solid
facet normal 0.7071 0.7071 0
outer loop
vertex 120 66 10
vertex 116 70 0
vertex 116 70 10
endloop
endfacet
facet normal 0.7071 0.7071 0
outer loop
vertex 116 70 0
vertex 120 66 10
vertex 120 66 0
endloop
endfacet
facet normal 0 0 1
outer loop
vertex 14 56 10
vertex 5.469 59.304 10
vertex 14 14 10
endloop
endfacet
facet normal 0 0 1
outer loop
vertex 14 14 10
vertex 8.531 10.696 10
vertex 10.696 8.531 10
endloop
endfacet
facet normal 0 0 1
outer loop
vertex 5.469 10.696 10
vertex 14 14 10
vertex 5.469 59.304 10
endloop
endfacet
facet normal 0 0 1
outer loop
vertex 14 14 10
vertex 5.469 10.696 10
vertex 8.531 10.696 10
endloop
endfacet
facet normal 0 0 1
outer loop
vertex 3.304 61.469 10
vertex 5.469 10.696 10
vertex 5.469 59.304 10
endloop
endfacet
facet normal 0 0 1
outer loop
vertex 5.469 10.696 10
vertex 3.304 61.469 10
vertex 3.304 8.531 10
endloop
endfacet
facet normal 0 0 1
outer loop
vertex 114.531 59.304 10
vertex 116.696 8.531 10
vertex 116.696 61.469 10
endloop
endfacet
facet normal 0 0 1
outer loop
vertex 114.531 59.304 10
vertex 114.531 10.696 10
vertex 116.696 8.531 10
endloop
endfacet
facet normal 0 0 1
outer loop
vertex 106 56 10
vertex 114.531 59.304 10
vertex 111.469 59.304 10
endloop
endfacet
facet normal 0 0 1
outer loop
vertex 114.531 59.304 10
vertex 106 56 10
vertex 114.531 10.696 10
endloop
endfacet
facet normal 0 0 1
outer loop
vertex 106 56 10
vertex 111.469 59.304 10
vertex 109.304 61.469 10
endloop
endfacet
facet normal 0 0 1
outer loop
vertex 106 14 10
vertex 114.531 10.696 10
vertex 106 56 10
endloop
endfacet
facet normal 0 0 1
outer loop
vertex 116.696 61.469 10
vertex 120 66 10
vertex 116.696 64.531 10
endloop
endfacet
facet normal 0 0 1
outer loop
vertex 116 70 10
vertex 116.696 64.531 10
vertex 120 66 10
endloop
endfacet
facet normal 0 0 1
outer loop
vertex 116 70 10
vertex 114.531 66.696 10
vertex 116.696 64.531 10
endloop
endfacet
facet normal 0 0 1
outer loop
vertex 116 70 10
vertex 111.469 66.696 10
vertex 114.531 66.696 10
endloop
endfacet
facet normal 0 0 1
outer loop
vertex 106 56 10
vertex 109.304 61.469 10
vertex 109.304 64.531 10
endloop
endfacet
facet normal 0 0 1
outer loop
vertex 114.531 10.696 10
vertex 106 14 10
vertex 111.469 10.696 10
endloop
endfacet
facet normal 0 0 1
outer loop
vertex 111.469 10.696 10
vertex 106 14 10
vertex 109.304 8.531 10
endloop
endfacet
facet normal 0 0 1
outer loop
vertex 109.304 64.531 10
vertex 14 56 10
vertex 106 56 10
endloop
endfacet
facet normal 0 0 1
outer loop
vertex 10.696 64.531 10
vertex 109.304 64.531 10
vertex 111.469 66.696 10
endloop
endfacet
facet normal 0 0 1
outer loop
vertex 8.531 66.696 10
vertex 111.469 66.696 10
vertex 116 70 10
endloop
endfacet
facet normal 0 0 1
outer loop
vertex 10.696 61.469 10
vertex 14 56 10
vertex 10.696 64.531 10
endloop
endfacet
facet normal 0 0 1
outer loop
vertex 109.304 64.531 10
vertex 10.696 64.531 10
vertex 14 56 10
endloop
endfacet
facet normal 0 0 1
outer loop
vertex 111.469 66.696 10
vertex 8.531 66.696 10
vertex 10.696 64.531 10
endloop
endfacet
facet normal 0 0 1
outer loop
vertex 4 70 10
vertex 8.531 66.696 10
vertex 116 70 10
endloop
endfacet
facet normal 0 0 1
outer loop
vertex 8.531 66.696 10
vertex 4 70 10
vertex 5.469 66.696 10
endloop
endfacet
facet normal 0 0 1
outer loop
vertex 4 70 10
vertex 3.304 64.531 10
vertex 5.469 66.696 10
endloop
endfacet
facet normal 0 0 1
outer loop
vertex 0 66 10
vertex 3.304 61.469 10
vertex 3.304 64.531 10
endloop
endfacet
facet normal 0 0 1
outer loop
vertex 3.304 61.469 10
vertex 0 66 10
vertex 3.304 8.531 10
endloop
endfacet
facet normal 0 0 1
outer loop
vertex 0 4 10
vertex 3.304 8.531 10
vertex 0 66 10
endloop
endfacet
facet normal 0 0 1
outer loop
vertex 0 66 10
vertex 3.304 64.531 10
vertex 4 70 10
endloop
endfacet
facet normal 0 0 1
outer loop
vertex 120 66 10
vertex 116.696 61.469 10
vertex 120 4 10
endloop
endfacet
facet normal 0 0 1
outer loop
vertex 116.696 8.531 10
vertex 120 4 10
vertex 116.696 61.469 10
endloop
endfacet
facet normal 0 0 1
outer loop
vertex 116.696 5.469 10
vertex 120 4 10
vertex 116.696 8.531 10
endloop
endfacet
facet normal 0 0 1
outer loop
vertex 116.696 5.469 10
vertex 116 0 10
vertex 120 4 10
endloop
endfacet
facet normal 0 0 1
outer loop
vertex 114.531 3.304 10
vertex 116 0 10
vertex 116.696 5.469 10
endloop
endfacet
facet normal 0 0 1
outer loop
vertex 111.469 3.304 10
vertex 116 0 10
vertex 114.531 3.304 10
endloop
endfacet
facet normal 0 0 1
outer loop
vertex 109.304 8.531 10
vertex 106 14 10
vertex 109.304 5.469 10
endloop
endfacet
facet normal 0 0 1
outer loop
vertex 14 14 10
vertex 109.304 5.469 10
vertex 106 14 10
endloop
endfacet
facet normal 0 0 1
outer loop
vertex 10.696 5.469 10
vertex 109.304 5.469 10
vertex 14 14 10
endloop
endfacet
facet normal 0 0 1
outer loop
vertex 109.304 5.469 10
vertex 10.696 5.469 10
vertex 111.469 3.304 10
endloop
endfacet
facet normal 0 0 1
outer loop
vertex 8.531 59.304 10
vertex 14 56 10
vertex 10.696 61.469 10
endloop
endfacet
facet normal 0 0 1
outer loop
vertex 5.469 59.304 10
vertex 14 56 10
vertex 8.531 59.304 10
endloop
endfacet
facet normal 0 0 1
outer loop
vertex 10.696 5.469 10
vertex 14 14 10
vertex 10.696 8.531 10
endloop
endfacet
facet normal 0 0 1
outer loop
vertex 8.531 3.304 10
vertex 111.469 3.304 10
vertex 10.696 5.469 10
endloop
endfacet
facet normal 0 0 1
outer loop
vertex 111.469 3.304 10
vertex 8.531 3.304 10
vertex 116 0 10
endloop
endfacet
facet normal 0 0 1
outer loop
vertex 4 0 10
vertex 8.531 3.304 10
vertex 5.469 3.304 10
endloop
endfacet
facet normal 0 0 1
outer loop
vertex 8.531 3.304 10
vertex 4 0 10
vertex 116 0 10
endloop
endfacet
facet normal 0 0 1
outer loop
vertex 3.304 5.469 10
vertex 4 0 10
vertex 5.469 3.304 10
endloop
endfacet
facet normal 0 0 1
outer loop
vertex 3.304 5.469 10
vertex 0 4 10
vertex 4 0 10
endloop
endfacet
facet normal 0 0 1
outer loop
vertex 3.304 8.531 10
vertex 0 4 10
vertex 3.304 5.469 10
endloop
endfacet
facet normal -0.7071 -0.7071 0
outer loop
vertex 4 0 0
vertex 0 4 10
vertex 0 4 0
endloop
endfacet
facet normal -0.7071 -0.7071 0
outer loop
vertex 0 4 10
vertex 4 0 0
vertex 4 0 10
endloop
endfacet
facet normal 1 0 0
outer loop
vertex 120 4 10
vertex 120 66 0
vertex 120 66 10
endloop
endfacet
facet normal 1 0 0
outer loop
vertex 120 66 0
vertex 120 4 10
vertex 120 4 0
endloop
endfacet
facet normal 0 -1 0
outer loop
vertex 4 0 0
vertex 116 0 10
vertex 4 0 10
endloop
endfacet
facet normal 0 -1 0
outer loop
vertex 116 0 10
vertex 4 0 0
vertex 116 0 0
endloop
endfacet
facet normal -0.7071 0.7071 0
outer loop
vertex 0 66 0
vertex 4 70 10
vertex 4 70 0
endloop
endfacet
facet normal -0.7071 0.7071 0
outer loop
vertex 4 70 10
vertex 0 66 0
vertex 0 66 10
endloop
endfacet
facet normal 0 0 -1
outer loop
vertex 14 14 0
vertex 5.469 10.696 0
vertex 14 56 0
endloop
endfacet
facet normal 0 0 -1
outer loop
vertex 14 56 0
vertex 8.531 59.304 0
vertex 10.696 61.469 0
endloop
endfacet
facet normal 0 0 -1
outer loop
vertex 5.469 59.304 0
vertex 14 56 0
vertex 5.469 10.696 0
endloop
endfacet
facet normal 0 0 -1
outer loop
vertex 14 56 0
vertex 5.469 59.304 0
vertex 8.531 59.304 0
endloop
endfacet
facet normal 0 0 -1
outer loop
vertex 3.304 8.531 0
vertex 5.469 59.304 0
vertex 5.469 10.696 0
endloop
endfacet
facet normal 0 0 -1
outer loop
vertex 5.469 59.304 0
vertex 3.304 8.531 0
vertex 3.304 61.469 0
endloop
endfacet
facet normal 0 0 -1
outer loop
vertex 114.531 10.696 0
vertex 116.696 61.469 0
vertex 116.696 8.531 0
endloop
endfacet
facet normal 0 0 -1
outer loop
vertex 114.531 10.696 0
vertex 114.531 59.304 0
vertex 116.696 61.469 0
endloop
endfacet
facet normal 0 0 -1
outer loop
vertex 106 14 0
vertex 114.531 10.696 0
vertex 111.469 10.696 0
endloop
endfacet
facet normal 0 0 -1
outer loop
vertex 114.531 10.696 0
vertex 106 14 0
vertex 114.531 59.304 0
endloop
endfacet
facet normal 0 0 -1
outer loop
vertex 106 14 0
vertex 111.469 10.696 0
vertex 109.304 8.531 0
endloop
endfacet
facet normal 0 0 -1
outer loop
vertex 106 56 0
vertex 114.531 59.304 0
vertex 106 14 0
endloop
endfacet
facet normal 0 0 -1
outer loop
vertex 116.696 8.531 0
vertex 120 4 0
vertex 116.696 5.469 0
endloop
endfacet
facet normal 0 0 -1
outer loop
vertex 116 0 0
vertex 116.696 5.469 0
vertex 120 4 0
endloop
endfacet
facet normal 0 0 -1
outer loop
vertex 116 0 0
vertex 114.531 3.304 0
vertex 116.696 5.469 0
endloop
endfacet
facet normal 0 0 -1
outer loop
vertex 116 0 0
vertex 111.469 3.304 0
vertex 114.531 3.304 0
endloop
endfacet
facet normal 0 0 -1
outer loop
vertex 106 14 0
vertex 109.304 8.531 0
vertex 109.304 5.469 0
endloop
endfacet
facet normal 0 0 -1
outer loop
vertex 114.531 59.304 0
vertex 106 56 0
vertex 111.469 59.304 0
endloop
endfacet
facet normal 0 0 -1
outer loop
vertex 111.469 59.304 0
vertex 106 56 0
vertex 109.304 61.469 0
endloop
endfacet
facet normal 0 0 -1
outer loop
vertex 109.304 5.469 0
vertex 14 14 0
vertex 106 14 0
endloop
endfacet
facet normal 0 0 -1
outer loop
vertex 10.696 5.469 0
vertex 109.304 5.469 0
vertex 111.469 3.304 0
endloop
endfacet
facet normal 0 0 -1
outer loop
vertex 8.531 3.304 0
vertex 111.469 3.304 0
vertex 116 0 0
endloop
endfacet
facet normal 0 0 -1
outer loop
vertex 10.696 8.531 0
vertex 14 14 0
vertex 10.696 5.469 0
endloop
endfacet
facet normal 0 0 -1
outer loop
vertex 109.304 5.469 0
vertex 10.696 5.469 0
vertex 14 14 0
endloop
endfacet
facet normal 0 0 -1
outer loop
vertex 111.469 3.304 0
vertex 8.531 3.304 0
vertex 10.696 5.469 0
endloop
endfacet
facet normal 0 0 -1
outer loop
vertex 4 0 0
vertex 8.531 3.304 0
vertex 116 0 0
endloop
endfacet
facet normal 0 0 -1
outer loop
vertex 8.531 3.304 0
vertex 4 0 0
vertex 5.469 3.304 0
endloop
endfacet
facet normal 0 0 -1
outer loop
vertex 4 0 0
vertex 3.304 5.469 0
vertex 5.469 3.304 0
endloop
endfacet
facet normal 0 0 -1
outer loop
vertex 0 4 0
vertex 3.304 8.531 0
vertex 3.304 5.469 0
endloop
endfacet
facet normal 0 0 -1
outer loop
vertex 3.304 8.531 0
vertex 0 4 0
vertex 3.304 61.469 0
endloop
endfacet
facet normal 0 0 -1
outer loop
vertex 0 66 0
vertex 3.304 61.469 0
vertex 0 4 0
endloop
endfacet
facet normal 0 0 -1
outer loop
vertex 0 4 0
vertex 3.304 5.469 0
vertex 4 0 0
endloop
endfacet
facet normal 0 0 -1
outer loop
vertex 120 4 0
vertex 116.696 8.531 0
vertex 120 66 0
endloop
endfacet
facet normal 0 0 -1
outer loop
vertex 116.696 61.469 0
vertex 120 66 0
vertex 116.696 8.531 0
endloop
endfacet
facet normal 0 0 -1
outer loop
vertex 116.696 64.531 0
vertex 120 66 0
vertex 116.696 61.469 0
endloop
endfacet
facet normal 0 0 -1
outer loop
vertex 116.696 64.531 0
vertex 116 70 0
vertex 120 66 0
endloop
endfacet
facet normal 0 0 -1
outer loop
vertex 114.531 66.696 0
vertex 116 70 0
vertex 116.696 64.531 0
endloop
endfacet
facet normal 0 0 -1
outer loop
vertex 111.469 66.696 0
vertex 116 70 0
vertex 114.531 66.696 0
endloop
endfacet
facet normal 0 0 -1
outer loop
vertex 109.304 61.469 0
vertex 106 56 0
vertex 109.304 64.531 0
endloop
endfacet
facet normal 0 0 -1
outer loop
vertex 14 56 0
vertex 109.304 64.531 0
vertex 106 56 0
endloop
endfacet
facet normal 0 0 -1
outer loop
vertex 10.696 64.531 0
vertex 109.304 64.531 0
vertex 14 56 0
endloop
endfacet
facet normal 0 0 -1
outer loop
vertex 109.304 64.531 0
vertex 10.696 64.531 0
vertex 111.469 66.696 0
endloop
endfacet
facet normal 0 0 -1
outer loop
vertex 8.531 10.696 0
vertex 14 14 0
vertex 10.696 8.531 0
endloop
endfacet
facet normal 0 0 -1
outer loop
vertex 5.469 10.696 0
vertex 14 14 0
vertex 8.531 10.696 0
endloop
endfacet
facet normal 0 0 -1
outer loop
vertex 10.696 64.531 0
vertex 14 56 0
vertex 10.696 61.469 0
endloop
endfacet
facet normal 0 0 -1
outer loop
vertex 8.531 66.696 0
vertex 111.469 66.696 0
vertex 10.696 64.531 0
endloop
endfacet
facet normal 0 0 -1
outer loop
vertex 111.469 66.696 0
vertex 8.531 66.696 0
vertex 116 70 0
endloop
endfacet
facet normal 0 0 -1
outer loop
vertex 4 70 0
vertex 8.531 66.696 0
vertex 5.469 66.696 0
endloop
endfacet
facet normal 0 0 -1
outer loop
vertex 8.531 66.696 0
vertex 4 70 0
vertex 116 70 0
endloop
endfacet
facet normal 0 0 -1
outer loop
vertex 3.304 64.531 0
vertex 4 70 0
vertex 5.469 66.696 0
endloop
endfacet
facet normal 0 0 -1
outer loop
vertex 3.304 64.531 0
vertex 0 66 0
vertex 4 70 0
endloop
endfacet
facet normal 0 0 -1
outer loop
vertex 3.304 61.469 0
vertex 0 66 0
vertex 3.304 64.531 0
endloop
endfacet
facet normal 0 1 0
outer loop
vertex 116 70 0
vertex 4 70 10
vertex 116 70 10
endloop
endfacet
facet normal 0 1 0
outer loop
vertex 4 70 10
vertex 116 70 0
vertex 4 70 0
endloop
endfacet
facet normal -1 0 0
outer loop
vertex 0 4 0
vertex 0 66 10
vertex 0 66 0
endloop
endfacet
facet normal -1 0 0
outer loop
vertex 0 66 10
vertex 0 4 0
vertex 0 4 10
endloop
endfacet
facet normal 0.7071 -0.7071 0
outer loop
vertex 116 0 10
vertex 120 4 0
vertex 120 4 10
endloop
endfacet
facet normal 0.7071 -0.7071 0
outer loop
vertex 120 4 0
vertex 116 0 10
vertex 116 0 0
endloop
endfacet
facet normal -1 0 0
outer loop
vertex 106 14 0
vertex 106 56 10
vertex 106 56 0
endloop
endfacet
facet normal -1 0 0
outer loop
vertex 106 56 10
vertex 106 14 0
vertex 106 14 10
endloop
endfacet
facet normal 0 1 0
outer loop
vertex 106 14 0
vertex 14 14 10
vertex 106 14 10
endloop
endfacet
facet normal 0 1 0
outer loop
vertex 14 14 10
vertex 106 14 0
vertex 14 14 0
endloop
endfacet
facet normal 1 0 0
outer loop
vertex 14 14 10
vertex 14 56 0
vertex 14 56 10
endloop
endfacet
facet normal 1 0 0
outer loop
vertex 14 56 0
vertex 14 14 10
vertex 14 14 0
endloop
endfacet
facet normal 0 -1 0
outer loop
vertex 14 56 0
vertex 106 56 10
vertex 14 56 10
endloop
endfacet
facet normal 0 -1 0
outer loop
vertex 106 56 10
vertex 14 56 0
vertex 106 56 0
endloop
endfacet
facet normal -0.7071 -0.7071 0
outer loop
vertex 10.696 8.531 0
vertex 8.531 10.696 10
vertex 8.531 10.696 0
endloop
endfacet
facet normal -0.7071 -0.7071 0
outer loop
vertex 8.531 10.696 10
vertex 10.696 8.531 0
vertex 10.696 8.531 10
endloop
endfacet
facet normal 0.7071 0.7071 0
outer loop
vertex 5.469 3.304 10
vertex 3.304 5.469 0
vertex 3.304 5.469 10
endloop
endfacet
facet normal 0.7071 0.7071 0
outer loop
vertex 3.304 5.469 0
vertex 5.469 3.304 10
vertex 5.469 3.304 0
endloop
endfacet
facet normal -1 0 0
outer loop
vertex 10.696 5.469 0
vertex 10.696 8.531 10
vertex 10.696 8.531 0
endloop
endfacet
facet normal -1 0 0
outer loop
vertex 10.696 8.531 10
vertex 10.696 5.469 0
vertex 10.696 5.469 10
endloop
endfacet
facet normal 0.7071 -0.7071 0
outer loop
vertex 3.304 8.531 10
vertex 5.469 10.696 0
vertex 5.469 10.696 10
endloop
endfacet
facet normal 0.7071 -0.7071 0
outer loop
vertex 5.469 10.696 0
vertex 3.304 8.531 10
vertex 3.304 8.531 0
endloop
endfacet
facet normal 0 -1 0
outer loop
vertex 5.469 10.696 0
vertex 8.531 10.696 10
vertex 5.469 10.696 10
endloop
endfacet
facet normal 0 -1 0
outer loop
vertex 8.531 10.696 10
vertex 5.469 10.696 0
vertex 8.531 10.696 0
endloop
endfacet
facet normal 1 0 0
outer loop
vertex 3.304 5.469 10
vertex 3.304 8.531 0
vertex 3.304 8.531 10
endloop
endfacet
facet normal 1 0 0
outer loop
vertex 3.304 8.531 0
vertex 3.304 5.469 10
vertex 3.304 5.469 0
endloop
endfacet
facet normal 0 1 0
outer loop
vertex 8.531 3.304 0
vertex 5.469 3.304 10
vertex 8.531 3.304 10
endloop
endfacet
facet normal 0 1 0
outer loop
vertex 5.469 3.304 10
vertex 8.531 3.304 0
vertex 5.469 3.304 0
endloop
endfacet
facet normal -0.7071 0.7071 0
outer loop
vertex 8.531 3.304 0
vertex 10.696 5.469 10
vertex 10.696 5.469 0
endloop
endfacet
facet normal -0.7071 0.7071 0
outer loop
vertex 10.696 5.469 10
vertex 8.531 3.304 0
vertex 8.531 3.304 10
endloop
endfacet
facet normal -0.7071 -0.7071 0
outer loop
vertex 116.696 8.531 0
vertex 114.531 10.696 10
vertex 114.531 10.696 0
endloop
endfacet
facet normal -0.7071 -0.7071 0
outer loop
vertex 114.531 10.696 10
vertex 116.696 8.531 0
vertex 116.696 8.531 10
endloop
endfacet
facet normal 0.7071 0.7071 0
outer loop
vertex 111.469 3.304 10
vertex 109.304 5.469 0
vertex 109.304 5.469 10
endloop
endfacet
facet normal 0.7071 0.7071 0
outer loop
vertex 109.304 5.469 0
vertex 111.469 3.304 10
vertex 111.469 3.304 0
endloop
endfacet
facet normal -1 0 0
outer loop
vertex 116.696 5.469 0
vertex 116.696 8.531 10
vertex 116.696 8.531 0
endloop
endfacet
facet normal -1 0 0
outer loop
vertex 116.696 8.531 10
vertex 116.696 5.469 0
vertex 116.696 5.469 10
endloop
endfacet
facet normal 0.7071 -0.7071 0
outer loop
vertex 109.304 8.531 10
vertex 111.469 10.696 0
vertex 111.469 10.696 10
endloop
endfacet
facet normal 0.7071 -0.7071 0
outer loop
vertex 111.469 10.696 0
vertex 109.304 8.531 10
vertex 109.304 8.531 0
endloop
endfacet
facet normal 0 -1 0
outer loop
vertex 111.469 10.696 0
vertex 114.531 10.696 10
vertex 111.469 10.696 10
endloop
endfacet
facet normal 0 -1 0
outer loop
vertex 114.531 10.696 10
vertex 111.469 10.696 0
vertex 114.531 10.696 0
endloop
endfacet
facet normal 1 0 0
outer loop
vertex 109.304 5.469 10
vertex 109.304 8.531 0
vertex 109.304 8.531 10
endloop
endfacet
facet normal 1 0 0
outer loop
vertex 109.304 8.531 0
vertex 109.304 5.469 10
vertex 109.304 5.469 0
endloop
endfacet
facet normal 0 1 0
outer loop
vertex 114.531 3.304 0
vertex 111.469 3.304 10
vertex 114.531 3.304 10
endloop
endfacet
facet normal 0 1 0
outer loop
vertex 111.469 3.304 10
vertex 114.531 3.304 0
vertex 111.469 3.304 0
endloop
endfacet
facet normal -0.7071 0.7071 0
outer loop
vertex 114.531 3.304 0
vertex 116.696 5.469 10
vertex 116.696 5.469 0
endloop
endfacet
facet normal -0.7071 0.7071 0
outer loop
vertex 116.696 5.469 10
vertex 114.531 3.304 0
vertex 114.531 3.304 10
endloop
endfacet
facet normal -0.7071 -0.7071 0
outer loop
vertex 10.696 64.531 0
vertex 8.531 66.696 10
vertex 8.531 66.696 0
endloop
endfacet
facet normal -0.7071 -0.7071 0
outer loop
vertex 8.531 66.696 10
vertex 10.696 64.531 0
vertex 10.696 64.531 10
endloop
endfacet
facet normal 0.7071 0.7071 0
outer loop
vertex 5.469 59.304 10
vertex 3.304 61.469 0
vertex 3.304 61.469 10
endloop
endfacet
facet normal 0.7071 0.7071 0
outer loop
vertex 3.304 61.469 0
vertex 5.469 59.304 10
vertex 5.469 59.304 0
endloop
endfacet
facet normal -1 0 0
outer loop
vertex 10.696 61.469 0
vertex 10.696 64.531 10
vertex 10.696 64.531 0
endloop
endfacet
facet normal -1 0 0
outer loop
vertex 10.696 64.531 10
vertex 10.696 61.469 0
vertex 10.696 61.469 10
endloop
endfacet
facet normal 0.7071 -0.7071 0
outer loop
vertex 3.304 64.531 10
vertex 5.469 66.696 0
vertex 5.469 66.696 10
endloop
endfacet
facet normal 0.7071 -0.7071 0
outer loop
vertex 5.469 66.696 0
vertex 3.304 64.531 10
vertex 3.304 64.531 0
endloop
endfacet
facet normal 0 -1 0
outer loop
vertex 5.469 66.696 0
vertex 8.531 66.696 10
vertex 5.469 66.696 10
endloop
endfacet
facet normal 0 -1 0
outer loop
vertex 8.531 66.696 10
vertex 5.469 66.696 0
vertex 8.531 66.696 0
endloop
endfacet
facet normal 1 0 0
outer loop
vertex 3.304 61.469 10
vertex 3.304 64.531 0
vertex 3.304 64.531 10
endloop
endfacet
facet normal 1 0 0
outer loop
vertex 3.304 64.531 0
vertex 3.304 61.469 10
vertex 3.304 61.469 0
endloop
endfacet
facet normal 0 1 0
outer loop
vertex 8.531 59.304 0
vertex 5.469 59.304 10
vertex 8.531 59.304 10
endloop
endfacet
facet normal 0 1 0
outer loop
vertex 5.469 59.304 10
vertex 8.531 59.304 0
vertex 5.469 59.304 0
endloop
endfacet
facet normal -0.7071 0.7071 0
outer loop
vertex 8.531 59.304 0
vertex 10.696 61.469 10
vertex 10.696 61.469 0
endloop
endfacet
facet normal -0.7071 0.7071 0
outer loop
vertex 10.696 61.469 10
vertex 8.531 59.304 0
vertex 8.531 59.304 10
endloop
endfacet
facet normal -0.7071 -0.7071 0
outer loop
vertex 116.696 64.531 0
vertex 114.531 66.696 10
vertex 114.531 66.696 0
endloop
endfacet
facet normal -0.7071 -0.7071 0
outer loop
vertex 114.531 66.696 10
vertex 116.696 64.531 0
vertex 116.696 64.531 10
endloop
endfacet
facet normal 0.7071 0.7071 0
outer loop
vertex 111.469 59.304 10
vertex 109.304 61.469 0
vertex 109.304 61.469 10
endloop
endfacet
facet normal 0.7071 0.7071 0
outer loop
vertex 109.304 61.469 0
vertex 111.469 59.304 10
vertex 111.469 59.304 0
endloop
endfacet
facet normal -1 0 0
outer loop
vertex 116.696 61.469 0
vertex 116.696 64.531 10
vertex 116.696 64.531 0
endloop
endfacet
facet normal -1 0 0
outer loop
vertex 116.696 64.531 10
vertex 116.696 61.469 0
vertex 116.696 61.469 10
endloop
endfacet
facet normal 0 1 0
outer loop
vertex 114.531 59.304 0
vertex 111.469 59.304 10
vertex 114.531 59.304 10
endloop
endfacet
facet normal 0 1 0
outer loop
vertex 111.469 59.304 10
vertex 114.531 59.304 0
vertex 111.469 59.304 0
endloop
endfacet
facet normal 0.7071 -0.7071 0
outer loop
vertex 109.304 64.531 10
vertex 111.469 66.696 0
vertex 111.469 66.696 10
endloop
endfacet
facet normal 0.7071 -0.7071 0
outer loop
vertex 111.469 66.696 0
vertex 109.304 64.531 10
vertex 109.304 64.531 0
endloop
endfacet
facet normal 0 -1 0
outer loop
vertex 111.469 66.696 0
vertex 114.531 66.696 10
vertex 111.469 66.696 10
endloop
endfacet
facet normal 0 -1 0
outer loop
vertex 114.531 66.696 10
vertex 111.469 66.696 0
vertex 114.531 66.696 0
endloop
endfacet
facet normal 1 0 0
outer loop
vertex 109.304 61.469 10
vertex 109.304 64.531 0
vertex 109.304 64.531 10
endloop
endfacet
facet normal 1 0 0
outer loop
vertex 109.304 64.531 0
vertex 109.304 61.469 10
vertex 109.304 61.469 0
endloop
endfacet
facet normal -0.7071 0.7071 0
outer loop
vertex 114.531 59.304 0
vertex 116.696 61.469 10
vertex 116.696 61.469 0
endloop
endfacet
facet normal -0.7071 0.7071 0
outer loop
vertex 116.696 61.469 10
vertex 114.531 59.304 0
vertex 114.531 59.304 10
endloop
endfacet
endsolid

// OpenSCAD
$fn = 32;

// ----------------------------------------------------------------------
// Frame plate: 120 x 70 frame, 14 mm rails
// ----------------------------------------------------------------------

// --- parameters (mm) ---
plate_l = 120;            // plate length, X
plate_w = 70;             // plate width, Y
plate_t = 10;             // plate thickness, Z (extrusion height)
corner_c = 4;             // corner chamfer
frame_bar = 14;           // frame rail width
bolt_r = 4;               // corner bolt window radius
bolt_inset = 7;           // bolt centre inset from the edges

win_l = plate_l - 2 * frame_bar;  // window length
win_w = plate_w - 2 * frame_bar;  // window width
bolt_d = 2 * bolt_r;  // corner hole diameter

profile = [[4, 0], [116, 0], [120, 4], [120, 66], [116, 70], [4, 70], [0, 66], [0, 4]];  // primary outline, 8 points, counter clockwise
void_1 = [[14, 14], [106, 14], [106, 56], [14, 56]];  // the window, 4 points
void_2 = [[10.696, 8.531], [8.531, 10.696], [5.469, 10.696], [3.304, 8.531], [3.304, 5.469], [5.469, 3.304], [8.531, 3.304], [10.696, 5.469]];  // corner bolt window, 8 points
void_3 = [[116.696, 8.531], [114.531, 10.696], [111.469, 10.696], [109.304, 8.531], [109.304, 5.469], [111.469, 3.304], [114.531, 3.304], [116.696, 5.469]];  // corner bolt window, 8 points
void_4 = [[10.696, 64.531], [8.531, 66.696], [5.469, 66.696], [3.304, 64.531], [3.304, 61.469], [5.469, 59.304], [8.531, 59.304], [10.696, 61.469]];  // corner bolt window, 8 points
void_5 = [[116.696, 64.531], [114.531, 66.696], [111.469, 66.696], [109.304, 64.531], [109.304, 61.469], [111.469, 59.304], [114.531, 59.304], [116.696, 61.469]];  // corner bolt window, 8 points

// --- the one profile operation ---
difference() {
  linear_extrude(height = plate_t) polygon(points = profile);
  translate([0, 0, -1])
    linear_extrude(height = plate_t + 2) polygon(points = void_1);
  translate([0, 0, -1])
    linear_extrude(height = plate_t + 2) polygon(points = void_2);
  translate([0, 0, -1])
    linear_extrude(height = plate_t + 2) polygon(points = void_3);
  translate([0, 0, -1])
    linear_extrude(height = plate_t + 2) polygon(points = void_4);
  translate([0, 0, -1])
    linear_extrude(height = plate_t + 2) polygon(points = void_5);
}
